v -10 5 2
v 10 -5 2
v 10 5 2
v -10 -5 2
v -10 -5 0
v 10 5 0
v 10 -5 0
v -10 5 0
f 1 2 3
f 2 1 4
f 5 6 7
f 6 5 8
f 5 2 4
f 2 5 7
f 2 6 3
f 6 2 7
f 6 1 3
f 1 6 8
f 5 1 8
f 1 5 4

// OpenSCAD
// Auto-generated from tests/data/feature_fixtures_manifest.json
// fixture: plate_plain
// fixture_type: plate
// description: Baseline plain plate with no cutouts.
$fn = 96;

plate_size = [20.000000, 10.000000, 2.000000];
plate_origin = [-10.000000, -5.000000, 0.000000];

module through_hole(center, diameter, height) {
  translate(center) cylinder(d=diameter, h=height, center=false);
}

module through_slot(start, end, width, height) {
  hull() {
    through_hole(start, width, height);
    through_hole(end, width, height);
  }
}

module counterbore_hole(center, through_d, bore_d, bore_depth, plate_thickness) {
  translate([center[0], center[1], -0.1])
    cylinder(d=through_d, h=plate_thickness + 0.2, center=false);
  translate([center[0], center[1], plate_thickness - bore_depth])
    cylinder(d=bore_d, h=bore_depth + 0.1, center=false);
}

difference() {
  translate(plate_origin) cube(plate_size);
}
